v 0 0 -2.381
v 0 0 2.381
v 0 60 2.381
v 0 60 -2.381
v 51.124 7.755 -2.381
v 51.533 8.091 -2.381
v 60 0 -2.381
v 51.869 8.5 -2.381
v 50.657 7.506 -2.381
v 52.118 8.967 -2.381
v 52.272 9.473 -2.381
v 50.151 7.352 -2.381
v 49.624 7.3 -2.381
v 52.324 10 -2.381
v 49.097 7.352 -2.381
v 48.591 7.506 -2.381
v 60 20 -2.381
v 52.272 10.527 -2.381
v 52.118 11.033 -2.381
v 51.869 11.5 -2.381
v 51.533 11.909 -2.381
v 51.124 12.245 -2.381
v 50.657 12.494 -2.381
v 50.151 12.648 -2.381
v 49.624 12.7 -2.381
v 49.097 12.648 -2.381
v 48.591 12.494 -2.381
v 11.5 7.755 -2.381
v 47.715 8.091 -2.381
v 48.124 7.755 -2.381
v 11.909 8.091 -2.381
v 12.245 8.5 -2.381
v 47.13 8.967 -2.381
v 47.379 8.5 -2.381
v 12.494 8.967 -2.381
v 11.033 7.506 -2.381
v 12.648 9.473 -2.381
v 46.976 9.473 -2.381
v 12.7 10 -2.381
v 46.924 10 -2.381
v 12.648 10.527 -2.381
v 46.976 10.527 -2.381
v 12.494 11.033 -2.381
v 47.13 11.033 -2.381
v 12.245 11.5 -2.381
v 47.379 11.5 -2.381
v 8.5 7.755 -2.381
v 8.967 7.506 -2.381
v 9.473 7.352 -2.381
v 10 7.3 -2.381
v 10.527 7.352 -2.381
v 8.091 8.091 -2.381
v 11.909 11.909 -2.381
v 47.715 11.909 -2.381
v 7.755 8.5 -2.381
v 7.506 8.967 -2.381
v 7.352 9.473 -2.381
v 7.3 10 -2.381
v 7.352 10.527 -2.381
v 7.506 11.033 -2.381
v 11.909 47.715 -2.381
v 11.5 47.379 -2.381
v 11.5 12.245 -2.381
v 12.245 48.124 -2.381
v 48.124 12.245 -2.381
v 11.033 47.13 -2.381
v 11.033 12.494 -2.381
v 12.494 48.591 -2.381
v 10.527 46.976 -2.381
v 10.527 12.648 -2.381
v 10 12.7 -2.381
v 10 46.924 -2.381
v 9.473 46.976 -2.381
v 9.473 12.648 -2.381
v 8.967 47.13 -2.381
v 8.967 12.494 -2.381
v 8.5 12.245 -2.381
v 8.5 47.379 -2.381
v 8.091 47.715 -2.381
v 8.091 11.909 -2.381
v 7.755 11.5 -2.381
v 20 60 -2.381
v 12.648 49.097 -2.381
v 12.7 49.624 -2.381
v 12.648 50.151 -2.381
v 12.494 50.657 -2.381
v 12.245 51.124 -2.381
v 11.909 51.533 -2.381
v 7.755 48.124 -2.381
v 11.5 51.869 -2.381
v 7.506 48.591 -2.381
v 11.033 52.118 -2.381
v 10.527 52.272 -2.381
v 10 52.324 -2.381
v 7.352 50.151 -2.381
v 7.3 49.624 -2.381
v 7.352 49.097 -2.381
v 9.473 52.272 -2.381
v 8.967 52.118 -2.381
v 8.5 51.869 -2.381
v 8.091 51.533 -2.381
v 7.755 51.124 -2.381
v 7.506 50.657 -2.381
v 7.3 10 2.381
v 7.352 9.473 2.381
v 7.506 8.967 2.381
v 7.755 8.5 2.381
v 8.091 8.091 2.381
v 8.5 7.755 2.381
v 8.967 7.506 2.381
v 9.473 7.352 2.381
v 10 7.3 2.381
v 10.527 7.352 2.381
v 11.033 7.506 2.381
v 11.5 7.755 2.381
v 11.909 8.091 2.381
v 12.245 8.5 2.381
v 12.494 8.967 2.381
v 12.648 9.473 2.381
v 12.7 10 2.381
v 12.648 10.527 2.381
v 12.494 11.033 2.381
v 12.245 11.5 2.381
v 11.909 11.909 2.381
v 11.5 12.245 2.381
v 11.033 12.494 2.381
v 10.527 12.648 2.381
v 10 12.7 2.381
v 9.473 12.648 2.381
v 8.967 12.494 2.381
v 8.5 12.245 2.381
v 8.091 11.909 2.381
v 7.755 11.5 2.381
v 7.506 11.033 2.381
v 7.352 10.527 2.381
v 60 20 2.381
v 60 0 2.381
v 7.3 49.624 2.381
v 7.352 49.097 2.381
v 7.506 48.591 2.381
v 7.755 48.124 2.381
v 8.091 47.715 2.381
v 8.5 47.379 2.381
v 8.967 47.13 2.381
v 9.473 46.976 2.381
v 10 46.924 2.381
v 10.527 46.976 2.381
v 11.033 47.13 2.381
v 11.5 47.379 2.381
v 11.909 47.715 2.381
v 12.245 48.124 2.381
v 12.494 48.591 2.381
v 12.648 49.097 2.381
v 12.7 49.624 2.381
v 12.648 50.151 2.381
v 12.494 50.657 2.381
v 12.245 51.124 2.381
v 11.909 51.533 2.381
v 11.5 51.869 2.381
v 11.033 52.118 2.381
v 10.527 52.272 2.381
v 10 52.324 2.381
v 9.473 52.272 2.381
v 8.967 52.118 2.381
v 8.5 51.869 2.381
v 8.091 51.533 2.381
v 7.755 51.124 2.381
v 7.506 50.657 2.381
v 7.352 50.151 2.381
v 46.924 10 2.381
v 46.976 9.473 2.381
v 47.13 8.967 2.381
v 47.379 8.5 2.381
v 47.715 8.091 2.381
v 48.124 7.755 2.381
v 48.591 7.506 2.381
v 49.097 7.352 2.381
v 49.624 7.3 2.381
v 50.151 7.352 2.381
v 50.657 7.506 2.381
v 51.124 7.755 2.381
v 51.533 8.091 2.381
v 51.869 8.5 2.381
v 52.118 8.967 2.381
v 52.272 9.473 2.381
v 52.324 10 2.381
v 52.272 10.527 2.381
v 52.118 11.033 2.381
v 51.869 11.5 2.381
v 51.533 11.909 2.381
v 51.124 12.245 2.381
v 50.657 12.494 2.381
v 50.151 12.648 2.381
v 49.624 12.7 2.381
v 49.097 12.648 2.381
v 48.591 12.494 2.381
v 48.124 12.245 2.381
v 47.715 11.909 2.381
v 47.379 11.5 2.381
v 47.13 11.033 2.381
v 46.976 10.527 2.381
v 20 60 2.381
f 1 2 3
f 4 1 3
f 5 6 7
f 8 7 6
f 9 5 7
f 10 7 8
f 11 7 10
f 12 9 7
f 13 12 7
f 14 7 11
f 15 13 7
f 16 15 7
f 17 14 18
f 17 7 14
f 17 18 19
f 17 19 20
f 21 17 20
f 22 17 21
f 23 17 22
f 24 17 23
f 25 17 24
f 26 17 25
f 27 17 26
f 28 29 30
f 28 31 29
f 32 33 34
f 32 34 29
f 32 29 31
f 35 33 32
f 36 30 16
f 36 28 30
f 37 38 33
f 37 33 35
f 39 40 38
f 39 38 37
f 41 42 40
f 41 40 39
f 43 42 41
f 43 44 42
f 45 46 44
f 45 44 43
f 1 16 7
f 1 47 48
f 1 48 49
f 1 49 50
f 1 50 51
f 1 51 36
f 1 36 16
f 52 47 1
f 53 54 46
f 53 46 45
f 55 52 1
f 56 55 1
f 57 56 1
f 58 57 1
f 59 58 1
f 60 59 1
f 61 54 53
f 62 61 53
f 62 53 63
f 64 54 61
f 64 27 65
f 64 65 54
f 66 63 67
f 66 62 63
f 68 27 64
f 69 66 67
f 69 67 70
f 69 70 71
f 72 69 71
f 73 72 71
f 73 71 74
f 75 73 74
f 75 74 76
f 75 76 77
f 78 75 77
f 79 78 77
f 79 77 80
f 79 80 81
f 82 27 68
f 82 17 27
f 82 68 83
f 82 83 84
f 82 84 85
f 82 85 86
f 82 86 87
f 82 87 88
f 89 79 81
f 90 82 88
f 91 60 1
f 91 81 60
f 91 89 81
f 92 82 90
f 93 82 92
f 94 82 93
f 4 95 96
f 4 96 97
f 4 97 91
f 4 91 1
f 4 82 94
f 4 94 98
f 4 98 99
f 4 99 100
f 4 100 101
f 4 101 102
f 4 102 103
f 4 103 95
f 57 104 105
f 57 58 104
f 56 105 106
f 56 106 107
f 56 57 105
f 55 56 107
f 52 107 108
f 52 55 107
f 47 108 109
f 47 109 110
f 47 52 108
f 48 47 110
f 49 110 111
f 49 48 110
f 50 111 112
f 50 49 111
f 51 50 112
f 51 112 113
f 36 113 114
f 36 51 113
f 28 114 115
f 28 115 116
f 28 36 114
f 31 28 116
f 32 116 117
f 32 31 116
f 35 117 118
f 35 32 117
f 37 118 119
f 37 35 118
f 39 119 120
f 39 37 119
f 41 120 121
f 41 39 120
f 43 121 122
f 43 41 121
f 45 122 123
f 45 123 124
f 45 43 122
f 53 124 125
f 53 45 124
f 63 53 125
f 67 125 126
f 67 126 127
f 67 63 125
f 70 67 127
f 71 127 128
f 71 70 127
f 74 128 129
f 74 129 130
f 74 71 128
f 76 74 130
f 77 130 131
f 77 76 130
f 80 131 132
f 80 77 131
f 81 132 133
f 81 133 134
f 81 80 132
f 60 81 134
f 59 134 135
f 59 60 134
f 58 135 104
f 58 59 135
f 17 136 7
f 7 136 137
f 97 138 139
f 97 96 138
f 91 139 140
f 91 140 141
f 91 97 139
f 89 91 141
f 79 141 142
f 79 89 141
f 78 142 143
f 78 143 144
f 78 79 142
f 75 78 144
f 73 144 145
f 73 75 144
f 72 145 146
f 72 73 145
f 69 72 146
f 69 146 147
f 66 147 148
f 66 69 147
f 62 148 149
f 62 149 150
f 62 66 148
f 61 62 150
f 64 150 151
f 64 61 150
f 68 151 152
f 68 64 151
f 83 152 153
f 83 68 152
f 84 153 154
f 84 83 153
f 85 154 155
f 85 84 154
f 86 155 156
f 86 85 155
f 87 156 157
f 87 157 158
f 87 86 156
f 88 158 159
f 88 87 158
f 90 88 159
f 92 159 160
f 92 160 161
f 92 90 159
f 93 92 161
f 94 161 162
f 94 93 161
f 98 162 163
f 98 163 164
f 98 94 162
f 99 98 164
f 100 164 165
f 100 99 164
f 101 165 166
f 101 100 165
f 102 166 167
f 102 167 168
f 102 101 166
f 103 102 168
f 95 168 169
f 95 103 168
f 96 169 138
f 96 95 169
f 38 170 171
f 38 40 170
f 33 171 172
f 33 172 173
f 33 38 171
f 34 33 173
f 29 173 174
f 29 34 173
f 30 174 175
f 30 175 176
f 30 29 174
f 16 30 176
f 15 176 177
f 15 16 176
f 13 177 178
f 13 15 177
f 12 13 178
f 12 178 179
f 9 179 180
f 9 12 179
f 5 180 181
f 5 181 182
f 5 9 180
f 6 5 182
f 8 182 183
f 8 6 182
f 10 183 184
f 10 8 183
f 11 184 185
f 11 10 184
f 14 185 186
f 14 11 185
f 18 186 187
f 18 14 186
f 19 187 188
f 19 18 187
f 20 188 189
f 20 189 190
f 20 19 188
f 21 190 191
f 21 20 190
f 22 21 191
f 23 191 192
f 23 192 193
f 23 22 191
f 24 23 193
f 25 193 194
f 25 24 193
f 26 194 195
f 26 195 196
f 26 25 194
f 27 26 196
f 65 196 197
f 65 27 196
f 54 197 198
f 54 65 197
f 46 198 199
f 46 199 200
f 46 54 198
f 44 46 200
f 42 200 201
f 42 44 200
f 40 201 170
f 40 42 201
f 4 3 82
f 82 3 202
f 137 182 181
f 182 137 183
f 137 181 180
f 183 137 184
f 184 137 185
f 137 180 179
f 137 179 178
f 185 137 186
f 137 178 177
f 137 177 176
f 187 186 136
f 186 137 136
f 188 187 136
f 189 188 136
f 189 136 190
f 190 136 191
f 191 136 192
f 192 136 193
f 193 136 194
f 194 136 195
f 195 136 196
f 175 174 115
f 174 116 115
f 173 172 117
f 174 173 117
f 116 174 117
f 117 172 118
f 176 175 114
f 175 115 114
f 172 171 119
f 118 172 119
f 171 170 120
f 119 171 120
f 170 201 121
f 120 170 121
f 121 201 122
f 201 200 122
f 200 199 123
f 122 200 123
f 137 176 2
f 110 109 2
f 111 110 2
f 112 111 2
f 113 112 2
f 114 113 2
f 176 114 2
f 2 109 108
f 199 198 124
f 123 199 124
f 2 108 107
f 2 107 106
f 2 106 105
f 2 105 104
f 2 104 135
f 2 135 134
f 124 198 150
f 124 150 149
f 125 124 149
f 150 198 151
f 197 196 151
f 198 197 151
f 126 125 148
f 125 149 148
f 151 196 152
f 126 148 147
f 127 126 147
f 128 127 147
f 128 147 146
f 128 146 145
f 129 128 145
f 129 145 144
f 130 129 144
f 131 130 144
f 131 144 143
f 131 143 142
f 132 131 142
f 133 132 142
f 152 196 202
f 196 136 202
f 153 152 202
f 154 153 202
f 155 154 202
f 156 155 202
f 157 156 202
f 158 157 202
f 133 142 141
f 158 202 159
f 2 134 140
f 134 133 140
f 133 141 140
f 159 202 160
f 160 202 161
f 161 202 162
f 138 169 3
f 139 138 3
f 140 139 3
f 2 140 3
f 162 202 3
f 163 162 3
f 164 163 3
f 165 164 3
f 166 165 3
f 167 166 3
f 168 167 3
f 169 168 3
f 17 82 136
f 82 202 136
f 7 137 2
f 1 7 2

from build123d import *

# Parameters (mm, degrees)
SKETCH1_R           = 2.7
BOSS_EXTRUDE1_DEPTH = 2.38125


with BuildPart() as part:
    # Sketch1 → Boss-Extrude1 (new, symmetric)
    with BuildSketch(Plane.XY):
        Polygon((0, 0), (0, 60), (20, 60), (60, 20), (60, 0), align=None)
        with Locations(Location((10, 10, 0), (0, 0, 180))):
            Circle(SKETCH1_R, mode=Mode.SUBTRACT)
        with Locations(Location((49.624, 10, 0), (0, 0, 180))):
            Circle(SKETCH1_R, mode=Mode.SUBTRACT)
        with Locations(Location((10, 49.624, 0), (0, 0, 180))):
            Circle(SKETCH1_R, mode=Mode.SUBTRACT)
    extrude(amount=BOSS_EXTRUDE1_DEPTH, both=True)


solid = part.part
